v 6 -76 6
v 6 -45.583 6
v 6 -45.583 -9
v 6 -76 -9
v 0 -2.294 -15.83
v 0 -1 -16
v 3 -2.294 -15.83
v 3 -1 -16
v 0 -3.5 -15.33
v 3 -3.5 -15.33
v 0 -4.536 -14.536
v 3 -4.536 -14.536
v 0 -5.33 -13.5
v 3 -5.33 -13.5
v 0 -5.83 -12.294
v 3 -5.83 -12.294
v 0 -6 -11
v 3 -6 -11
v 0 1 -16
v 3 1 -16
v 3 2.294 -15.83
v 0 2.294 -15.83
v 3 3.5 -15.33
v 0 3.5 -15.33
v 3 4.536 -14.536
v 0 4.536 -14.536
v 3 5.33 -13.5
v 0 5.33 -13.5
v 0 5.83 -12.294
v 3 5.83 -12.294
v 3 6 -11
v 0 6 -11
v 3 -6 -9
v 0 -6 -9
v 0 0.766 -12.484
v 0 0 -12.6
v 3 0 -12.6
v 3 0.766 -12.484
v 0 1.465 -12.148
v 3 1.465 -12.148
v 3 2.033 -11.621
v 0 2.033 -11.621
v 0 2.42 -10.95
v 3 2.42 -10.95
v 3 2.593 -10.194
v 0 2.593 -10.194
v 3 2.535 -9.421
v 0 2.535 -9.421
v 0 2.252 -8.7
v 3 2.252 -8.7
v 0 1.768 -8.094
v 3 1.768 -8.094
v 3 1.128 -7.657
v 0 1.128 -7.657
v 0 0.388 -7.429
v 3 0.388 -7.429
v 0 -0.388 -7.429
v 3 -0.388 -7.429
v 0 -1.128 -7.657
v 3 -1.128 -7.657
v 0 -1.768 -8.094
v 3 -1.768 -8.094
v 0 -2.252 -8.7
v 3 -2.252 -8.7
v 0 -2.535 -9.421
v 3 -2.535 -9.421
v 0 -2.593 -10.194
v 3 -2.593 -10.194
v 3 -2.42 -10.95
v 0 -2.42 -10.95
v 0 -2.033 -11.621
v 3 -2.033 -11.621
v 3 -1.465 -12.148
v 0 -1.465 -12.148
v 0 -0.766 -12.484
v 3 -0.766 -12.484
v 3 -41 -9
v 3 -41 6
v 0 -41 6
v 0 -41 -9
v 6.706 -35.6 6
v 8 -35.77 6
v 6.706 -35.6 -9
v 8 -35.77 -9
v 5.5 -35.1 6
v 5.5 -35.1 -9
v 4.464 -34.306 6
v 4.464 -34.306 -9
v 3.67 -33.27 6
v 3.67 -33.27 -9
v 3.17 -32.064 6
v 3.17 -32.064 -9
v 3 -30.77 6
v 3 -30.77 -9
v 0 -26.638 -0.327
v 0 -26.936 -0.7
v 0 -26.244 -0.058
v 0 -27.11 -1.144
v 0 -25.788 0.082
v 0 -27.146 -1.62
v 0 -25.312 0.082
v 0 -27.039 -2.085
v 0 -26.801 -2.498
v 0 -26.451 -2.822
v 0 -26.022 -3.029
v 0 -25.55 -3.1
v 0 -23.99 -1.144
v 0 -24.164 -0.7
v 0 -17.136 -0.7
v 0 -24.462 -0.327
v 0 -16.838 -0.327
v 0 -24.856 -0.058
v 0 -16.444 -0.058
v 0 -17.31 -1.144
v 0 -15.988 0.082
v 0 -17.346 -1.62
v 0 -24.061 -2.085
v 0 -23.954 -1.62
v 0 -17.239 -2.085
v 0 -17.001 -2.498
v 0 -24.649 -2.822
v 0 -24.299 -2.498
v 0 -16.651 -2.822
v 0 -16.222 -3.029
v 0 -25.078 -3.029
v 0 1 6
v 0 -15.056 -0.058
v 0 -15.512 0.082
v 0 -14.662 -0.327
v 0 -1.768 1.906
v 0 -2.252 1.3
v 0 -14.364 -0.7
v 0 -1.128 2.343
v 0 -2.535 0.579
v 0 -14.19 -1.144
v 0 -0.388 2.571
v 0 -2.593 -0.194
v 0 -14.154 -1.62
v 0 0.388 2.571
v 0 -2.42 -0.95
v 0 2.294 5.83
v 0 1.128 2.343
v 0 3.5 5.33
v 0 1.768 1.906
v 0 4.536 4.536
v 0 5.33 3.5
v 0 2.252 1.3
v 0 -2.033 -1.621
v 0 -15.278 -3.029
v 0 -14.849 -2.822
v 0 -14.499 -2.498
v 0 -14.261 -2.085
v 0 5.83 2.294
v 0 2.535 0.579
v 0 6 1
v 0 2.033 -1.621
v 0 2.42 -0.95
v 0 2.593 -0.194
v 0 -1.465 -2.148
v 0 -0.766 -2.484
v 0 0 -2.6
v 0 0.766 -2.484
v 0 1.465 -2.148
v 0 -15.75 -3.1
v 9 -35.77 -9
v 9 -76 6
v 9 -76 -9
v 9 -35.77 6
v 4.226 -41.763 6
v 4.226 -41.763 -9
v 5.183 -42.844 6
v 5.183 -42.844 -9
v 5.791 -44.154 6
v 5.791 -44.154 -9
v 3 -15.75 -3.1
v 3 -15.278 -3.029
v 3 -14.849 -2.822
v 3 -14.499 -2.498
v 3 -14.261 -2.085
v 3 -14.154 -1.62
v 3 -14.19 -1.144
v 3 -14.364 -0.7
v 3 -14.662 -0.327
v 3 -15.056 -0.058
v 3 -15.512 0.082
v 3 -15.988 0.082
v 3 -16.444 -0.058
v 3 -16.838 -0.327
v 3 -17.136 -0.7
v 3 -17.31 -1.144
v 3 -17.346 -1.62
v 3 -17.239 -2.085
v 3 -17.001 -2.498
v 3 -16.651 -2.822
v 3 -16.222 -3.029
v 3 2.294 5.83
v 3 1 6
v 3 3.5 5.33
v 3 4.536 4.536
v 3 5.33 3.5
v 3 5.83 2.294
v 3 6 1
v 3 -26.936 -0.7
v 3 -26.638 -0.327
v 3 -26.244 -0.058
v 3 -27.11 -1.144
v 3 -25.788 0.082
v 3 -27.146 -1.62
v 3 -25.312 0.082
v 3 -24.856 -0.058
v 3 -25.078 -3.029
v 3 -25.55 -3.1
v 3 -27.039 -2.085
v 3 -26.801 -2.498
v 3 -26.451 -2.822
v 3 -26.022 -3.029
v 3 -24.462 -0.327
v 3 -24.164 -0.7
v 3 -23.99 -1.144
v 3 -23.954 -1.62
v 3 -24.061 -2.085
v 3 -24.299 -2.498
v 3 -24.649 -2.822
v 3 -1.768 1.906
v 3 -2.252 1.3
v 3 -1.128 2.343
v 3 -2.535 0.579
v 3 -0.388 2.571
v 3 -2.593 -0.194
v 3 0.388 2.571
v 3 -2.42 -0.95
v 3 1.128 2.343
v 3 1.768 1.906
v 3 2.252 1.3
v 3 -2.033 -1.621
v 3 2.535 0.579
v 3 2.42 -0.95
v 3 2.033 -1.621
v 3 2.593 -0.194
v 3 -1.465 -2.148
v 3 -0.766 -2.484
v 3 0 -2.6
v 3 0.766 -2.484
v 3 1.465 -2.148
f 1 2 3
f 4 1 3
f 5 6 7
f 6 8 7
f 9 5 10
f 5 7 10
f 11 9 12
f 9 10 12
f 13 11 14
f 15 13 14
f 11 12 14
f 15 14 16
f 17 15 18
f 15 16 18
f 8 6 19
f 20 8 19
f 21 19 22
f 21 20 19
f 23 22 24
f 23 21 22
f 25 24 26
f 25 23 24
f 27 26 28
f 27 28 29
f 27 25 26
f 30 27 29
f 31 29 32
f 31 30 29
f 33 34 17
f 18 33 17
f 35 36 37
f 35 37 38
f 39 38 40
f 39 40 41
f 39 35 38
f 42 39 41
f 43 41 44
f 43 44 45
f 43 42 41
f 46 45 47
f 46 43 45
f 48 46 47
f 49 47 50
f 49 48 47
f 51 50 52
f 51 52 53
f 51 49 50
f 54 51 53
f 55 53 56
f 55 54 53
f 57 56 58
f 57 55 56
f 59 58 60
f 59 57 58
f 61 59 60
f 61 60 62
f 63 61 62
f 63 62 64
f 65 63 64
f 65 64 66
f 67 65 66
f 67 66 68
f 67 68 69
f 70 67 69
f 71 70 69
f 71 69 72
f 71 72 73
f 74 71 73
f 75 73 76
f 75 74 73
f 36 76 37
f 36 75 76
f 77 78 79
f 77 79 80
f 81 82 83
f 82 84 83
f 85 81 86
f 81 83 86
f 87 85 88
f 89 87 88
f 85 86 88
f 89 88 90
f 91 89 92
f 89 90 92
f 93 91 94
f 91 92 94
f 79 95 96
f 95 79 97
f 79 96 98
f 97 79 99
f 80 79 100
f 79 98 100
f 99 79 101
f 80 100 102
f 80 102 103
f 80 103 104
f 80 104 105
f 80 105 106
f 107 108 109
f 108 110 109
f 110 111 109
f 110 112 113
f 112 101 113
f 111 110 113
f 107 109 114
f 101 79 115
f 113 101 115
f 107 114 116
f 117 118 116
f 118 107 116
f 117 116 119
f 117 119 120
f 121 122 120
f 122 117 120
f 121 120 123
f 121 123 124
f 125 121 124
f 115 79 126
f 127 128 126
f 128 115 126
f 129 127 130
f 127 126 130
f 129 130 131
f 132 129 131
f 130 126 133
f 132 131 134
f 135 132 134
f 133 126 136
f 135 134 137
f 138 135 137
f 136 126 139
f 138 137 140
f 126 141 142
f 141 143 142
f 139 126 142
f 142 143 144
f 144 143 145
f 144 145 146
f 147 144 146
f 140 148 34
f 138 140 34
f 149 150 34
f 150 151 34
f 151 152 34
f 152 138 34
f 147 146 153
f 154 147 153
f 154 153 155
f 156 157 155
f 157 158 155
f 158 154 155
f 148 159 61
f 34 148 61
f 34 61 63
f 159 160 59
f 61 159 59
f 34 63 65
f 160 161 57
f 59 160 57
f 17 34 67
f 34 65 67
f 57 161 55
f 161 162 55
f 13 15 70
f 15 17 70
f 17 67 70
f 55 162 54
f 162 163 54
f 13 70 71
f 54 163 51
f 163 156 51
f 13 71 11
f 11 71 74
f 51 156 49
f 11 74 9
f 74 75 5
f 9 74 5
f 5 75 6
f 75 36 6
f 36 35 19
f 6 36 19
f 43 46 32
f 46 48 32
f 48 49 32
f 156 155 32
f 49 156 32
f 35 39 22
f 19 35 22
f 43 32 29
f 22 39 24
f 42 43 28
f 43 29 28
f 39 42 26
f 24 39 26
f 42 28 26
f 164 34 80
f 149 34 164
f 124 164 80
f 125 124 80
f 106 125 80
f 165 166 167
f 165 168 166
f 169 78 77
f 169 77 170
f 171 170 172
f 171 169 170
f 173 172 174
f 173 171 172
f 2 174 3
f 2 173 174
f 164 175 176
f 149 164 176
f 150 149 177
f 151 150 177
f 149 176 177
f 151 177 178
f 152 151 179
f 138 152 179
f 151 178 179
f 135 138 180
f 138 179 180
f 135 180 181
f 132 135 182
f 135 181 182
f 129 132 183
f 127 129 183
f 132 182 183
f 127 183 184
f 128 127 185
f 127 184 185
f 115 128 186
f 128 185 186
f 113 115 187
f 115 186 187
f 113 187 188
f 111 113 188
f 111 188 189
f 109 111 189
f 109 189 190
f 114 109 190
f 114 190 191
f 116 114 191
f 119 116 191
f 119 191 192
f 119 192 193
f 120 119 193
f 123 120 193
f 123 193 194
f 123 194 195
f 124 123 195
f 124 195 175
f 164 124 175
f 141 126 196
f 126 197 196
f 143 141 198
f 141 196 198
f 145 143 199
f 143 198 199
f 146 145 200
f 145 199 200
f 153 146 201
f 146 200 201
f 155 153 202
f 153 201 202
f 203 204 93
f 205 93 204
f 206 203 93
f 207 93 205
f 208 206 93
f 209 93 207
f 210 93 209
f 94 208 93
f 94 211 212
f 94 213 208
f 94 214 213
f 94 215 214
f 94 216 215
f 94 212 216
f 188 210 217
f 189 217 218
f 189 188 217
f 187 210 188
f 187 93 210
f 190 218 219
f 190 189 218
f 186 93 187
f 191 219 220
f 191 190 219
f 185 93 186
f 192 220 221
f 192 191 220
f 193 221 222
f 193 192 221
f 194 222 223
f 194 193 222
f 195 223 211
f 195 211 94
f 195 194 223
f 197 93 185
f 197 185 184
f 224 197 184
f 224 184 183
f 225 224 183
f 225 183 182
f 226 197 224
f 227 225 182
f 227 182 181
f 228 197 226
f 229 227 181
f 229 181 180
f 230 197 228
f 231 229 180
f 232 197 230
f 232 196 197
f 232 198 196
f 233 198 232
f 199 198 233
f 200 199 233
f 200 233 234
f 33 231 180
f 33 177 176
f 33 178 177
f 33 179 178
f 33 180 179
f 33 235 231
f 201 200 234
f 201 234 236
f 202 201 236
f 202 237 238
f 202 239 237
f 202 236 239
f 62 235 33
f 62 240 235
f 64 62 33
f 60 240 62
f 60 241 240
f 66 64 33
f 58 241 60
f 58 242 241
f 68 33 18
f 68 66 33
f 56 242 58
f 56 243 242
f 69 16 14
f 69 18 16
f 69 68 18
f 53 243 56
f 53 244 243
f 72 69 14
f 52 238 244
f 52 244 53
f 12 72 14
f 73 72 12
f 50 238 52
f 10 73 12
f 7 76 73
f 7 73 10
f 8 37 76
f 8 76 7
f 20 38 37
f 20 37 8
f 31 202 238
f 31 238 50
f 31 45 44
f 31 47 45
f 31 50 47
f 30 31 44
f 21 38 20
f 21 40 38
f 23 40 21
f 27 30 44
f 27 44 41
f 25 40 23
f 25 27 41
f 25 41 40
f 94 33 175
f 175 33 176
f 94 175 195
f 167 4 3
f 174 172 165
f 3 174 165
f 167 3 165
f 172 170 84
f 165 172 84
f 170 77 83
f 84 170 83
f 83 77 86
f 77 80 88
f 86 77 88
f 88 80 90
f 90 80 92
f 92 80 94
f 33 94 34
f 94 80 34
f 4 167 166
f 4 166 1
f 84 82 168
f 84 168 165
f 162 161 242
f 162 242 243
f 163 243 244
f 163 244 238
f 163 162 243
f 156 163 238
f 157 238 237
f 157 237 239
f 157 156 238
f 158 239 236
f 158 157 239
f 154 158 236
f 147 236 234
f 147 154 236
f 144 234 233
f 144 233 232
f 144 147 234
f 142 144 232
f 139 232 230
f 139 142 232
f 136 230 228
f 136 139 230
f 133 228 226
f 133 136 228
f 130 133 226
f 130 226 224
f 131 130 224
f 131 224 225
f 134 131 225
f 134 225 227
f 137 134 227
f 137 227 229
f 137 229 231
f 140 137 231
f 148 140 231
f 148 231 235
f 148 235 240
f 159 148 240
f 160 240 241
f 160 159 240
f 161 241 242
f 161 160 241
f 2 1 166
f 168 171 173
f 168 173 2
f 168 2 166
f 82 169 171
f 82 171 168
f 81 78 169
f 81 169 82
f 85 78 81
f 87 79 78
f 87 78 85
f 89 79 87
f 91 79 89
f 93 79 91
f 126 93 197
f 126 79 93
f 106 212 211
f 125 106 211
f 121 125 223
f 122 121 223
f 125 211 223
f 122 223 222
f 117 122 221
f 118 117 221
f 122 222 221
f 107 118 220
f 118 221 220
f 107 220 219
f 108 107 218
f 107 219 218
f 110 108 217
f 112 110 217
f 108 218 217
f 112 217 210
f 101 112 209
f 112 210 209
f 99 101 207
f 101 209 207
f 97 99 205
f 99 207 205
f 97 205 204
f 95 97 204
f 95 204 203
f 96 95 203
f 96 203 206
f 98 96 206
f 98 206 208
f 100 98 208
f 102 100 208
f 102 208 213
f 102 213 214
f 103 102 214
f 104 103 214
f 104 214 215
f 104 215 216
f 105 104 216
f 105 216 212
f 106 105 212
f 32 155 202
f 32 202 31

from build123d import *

# Parameters (mm, degrees)
SKETCH1_W           = 22
SKETCH1_H           = 12
SKETCH1_R           = 2.6
BOSS_EXTRUDE1_DEPTH = 3
SKETCH2_W           = 15
SKETCH2_H           = 36
BOSS_EXTRUDE2_DEPTH = 3
FILLET1_R           = 5
FILLET2_R           = 1
SKETCH4_W           = 15
SKETCH4_H           = 34.286255804
BOSS_EXTRUDE3_DEPTH = 12.2
SKETCH7_W           = 12.2
SKETCH7_H           = 15
CUT_EXTRUDE3_DEPTH  = 50
SKETCH8_R           = 1.6
CUT_EXTRUDE4_DEPTH  = 10
SKETCH9_W           = 15
SKETCH9_H           = 5.23
BOSS_EXTRUDE4_DEPTH = 6
SKETCH10_W          = 3
SKETCH10_H          = 15
BOSS_EXTRUDE5_DEPTH = 35
FILLET3_R           = 5
FILLET4_R           = 5
SKETCH11_W          = 15.033805152
SKETCH11_H          = 2.020668066
CUT_EXTRUDE5_DEPTH  = 3


with BuildPart() as part:
    # Sketch1 → Boss-Extrude1 (new body)
    with BuildSketch(Plane(origin=(0, 0, 0), x_dir=(0, 0, -1), z_dir=(1, 0, 0))):
        with Locations((5, 0)):
            Rectangle(SKETCH1_W, SKETCH1_H)
        with Locations((10, 0)):
            Circle(SKETCH1_R, mode=Mode.SUBTRACT)
        Circle(SKETCH1_R, mode=Mode.SUBTRACT)
    extrude(amount=BOSS_EXTRUDE1_DEPTH)

    # Sketch2 → Boss-Extrude2 (add)
    with BuildSketch(Plane(origin=(0, 0, 0), x_dir=(0, 0, -1), z_dir=(1, 0, 0))):
        with Locations((1.5, -24)):
            Rectangle(SKETCH2_W, SKETCH2_H)
    extrude(amount=BOSS_EXTRUDE2_DEPTH)

    # Fillet1
    fillet1_edges = [part.edges().sort_by_distance(p)[0] for p in [
        (1.5, -6, -16),
        (1.5, 6, 6),
        (1.5, 6, -16),
    ]]
    fillet(fillet1_edges, radius=FILLET1_R)

    # Fillet2
    fillet2_edges = [part.edges().sort_by_distance(p)[0] for p in [
        (1.5, -42, 6),
        (1.5, -42, -9),
    ]]
    fillet(fillet2_edges, radius=FILLET2_R)

    # Sketch4 → Boss-Extrude3 (add)
    with BuildSketch(Plane(origin=(3, 0, 0), x_dir=(0, 0, -1), z_dir=(1, 0, 0))):
        with Locations((1.5, -23.856872098)):
            Rectangle(SKETCH4_W, SKETCH4_H)
    extrude(amount=BOSS_EXTRUDE3_DEPTH)

    # Sketch7 → Cut-Extrude3 (cut)
    with BuildSketch(Plane(origin=(0, -6.713744196, 0), x_dir=(1, 0, 0), z_dir=(0, 1, 0))):
        with Locations((9.1, 1.5)):
            Rectangle(SKETCH7_W, SKETCH7_H)
    extrude(amount=-CUT_EXTRUDE3_DEPTH, mode=Mode.SUBTRACT)

    # Sketch8 → Cut-Extrude4 (cut)
    with BuildSketch(Plane(origin=(3, 0, 0), x_dir=(0, 0, -1), z_dir=(1, 0, 0))):
        with Locations((1.5, -15.75)):
            Circle(SKETCH8_R)
        with Locations((1.5, -25.55)):
            Circle(SKETCH8_R)
    extrude(amount=-CUT_EXTRUDE4_DEPTH, mode=Mode.SUBTRACT)

    # Sketch9 → Boss-Extrude4 (add)
    with BuildSketch(Plane(origin=(3, 0, 0), x_dir=(0, 0, -1), z_dir=(1, 0, 0))):
        with Locations((1.5, -38.385)):
            Rectangle(SKETCH9_W, SKETCH9_H)
    extrude(amount=BOSS_EXTRUDE4_DEPTH)

    # Sketch10 → Boss-Extrude5 (add)
    with BuildSketch(Plane(origin=(0, -41, 0), x_dir=(-1, 0, 0), z_dir=(0, -1, 0))):
        with Locations((-7.5, 1.5)):
            Rectangle(SKETCH10_W, SKETCH10_H)
    extrude(amount=BOSS_EXTRUDE5_DEPTH)

    # Fillet3
    # the kernel refuses this fillet: 5 mm, written as the material it adds along each edge
    with BuildSketch(Plane(origin=(6, -41, 6), x_dir=(0, -1, 0), z_dir=(0, 0, -1))) as fillet3_piece_1:
        with BuildLine():
            CenterArc((4.582575695, 5), FILLET3_R, 203.578178478, 66.421821522)
            Line((0, 3), (-0.091651514, 2.96))
            ThreePointArc((-0.091651514, 2.96), (-0.1, 1.5), (-0.1, 0))
            Line((-0.1, 0), (0, -0.1))
            Line((0, -0.1), (4.582575695, -0.1))
            Line((4.582575695, -0.1), (4.582575695, 0))
        make_face()
    extrude(amount=15)

    # Fillet4
    fillet4_edges = [part.edges().sort_by_distance(p)[0] for p in [
        (3, -35.77, -1.5),
    ]]
    fillet(fillet4_edges, radius=FILLET4_R)

    # Sketch11 → Cut-Extrude5 (cut)
    with BuildSketch(Plane(origin=(3, 0, 0), x_dir=(0, 0, -1), z_dir=(1, 0, 0))):
        with Locations((1.516902576, -42.010334033)):
            Rectangle(SKETCH11_W, SKETCH11_H)
    extrude(amount=-CUT_EXTRUDE5_DEPTH, mode=Mode.SUBTRACT)


solid = part.part
